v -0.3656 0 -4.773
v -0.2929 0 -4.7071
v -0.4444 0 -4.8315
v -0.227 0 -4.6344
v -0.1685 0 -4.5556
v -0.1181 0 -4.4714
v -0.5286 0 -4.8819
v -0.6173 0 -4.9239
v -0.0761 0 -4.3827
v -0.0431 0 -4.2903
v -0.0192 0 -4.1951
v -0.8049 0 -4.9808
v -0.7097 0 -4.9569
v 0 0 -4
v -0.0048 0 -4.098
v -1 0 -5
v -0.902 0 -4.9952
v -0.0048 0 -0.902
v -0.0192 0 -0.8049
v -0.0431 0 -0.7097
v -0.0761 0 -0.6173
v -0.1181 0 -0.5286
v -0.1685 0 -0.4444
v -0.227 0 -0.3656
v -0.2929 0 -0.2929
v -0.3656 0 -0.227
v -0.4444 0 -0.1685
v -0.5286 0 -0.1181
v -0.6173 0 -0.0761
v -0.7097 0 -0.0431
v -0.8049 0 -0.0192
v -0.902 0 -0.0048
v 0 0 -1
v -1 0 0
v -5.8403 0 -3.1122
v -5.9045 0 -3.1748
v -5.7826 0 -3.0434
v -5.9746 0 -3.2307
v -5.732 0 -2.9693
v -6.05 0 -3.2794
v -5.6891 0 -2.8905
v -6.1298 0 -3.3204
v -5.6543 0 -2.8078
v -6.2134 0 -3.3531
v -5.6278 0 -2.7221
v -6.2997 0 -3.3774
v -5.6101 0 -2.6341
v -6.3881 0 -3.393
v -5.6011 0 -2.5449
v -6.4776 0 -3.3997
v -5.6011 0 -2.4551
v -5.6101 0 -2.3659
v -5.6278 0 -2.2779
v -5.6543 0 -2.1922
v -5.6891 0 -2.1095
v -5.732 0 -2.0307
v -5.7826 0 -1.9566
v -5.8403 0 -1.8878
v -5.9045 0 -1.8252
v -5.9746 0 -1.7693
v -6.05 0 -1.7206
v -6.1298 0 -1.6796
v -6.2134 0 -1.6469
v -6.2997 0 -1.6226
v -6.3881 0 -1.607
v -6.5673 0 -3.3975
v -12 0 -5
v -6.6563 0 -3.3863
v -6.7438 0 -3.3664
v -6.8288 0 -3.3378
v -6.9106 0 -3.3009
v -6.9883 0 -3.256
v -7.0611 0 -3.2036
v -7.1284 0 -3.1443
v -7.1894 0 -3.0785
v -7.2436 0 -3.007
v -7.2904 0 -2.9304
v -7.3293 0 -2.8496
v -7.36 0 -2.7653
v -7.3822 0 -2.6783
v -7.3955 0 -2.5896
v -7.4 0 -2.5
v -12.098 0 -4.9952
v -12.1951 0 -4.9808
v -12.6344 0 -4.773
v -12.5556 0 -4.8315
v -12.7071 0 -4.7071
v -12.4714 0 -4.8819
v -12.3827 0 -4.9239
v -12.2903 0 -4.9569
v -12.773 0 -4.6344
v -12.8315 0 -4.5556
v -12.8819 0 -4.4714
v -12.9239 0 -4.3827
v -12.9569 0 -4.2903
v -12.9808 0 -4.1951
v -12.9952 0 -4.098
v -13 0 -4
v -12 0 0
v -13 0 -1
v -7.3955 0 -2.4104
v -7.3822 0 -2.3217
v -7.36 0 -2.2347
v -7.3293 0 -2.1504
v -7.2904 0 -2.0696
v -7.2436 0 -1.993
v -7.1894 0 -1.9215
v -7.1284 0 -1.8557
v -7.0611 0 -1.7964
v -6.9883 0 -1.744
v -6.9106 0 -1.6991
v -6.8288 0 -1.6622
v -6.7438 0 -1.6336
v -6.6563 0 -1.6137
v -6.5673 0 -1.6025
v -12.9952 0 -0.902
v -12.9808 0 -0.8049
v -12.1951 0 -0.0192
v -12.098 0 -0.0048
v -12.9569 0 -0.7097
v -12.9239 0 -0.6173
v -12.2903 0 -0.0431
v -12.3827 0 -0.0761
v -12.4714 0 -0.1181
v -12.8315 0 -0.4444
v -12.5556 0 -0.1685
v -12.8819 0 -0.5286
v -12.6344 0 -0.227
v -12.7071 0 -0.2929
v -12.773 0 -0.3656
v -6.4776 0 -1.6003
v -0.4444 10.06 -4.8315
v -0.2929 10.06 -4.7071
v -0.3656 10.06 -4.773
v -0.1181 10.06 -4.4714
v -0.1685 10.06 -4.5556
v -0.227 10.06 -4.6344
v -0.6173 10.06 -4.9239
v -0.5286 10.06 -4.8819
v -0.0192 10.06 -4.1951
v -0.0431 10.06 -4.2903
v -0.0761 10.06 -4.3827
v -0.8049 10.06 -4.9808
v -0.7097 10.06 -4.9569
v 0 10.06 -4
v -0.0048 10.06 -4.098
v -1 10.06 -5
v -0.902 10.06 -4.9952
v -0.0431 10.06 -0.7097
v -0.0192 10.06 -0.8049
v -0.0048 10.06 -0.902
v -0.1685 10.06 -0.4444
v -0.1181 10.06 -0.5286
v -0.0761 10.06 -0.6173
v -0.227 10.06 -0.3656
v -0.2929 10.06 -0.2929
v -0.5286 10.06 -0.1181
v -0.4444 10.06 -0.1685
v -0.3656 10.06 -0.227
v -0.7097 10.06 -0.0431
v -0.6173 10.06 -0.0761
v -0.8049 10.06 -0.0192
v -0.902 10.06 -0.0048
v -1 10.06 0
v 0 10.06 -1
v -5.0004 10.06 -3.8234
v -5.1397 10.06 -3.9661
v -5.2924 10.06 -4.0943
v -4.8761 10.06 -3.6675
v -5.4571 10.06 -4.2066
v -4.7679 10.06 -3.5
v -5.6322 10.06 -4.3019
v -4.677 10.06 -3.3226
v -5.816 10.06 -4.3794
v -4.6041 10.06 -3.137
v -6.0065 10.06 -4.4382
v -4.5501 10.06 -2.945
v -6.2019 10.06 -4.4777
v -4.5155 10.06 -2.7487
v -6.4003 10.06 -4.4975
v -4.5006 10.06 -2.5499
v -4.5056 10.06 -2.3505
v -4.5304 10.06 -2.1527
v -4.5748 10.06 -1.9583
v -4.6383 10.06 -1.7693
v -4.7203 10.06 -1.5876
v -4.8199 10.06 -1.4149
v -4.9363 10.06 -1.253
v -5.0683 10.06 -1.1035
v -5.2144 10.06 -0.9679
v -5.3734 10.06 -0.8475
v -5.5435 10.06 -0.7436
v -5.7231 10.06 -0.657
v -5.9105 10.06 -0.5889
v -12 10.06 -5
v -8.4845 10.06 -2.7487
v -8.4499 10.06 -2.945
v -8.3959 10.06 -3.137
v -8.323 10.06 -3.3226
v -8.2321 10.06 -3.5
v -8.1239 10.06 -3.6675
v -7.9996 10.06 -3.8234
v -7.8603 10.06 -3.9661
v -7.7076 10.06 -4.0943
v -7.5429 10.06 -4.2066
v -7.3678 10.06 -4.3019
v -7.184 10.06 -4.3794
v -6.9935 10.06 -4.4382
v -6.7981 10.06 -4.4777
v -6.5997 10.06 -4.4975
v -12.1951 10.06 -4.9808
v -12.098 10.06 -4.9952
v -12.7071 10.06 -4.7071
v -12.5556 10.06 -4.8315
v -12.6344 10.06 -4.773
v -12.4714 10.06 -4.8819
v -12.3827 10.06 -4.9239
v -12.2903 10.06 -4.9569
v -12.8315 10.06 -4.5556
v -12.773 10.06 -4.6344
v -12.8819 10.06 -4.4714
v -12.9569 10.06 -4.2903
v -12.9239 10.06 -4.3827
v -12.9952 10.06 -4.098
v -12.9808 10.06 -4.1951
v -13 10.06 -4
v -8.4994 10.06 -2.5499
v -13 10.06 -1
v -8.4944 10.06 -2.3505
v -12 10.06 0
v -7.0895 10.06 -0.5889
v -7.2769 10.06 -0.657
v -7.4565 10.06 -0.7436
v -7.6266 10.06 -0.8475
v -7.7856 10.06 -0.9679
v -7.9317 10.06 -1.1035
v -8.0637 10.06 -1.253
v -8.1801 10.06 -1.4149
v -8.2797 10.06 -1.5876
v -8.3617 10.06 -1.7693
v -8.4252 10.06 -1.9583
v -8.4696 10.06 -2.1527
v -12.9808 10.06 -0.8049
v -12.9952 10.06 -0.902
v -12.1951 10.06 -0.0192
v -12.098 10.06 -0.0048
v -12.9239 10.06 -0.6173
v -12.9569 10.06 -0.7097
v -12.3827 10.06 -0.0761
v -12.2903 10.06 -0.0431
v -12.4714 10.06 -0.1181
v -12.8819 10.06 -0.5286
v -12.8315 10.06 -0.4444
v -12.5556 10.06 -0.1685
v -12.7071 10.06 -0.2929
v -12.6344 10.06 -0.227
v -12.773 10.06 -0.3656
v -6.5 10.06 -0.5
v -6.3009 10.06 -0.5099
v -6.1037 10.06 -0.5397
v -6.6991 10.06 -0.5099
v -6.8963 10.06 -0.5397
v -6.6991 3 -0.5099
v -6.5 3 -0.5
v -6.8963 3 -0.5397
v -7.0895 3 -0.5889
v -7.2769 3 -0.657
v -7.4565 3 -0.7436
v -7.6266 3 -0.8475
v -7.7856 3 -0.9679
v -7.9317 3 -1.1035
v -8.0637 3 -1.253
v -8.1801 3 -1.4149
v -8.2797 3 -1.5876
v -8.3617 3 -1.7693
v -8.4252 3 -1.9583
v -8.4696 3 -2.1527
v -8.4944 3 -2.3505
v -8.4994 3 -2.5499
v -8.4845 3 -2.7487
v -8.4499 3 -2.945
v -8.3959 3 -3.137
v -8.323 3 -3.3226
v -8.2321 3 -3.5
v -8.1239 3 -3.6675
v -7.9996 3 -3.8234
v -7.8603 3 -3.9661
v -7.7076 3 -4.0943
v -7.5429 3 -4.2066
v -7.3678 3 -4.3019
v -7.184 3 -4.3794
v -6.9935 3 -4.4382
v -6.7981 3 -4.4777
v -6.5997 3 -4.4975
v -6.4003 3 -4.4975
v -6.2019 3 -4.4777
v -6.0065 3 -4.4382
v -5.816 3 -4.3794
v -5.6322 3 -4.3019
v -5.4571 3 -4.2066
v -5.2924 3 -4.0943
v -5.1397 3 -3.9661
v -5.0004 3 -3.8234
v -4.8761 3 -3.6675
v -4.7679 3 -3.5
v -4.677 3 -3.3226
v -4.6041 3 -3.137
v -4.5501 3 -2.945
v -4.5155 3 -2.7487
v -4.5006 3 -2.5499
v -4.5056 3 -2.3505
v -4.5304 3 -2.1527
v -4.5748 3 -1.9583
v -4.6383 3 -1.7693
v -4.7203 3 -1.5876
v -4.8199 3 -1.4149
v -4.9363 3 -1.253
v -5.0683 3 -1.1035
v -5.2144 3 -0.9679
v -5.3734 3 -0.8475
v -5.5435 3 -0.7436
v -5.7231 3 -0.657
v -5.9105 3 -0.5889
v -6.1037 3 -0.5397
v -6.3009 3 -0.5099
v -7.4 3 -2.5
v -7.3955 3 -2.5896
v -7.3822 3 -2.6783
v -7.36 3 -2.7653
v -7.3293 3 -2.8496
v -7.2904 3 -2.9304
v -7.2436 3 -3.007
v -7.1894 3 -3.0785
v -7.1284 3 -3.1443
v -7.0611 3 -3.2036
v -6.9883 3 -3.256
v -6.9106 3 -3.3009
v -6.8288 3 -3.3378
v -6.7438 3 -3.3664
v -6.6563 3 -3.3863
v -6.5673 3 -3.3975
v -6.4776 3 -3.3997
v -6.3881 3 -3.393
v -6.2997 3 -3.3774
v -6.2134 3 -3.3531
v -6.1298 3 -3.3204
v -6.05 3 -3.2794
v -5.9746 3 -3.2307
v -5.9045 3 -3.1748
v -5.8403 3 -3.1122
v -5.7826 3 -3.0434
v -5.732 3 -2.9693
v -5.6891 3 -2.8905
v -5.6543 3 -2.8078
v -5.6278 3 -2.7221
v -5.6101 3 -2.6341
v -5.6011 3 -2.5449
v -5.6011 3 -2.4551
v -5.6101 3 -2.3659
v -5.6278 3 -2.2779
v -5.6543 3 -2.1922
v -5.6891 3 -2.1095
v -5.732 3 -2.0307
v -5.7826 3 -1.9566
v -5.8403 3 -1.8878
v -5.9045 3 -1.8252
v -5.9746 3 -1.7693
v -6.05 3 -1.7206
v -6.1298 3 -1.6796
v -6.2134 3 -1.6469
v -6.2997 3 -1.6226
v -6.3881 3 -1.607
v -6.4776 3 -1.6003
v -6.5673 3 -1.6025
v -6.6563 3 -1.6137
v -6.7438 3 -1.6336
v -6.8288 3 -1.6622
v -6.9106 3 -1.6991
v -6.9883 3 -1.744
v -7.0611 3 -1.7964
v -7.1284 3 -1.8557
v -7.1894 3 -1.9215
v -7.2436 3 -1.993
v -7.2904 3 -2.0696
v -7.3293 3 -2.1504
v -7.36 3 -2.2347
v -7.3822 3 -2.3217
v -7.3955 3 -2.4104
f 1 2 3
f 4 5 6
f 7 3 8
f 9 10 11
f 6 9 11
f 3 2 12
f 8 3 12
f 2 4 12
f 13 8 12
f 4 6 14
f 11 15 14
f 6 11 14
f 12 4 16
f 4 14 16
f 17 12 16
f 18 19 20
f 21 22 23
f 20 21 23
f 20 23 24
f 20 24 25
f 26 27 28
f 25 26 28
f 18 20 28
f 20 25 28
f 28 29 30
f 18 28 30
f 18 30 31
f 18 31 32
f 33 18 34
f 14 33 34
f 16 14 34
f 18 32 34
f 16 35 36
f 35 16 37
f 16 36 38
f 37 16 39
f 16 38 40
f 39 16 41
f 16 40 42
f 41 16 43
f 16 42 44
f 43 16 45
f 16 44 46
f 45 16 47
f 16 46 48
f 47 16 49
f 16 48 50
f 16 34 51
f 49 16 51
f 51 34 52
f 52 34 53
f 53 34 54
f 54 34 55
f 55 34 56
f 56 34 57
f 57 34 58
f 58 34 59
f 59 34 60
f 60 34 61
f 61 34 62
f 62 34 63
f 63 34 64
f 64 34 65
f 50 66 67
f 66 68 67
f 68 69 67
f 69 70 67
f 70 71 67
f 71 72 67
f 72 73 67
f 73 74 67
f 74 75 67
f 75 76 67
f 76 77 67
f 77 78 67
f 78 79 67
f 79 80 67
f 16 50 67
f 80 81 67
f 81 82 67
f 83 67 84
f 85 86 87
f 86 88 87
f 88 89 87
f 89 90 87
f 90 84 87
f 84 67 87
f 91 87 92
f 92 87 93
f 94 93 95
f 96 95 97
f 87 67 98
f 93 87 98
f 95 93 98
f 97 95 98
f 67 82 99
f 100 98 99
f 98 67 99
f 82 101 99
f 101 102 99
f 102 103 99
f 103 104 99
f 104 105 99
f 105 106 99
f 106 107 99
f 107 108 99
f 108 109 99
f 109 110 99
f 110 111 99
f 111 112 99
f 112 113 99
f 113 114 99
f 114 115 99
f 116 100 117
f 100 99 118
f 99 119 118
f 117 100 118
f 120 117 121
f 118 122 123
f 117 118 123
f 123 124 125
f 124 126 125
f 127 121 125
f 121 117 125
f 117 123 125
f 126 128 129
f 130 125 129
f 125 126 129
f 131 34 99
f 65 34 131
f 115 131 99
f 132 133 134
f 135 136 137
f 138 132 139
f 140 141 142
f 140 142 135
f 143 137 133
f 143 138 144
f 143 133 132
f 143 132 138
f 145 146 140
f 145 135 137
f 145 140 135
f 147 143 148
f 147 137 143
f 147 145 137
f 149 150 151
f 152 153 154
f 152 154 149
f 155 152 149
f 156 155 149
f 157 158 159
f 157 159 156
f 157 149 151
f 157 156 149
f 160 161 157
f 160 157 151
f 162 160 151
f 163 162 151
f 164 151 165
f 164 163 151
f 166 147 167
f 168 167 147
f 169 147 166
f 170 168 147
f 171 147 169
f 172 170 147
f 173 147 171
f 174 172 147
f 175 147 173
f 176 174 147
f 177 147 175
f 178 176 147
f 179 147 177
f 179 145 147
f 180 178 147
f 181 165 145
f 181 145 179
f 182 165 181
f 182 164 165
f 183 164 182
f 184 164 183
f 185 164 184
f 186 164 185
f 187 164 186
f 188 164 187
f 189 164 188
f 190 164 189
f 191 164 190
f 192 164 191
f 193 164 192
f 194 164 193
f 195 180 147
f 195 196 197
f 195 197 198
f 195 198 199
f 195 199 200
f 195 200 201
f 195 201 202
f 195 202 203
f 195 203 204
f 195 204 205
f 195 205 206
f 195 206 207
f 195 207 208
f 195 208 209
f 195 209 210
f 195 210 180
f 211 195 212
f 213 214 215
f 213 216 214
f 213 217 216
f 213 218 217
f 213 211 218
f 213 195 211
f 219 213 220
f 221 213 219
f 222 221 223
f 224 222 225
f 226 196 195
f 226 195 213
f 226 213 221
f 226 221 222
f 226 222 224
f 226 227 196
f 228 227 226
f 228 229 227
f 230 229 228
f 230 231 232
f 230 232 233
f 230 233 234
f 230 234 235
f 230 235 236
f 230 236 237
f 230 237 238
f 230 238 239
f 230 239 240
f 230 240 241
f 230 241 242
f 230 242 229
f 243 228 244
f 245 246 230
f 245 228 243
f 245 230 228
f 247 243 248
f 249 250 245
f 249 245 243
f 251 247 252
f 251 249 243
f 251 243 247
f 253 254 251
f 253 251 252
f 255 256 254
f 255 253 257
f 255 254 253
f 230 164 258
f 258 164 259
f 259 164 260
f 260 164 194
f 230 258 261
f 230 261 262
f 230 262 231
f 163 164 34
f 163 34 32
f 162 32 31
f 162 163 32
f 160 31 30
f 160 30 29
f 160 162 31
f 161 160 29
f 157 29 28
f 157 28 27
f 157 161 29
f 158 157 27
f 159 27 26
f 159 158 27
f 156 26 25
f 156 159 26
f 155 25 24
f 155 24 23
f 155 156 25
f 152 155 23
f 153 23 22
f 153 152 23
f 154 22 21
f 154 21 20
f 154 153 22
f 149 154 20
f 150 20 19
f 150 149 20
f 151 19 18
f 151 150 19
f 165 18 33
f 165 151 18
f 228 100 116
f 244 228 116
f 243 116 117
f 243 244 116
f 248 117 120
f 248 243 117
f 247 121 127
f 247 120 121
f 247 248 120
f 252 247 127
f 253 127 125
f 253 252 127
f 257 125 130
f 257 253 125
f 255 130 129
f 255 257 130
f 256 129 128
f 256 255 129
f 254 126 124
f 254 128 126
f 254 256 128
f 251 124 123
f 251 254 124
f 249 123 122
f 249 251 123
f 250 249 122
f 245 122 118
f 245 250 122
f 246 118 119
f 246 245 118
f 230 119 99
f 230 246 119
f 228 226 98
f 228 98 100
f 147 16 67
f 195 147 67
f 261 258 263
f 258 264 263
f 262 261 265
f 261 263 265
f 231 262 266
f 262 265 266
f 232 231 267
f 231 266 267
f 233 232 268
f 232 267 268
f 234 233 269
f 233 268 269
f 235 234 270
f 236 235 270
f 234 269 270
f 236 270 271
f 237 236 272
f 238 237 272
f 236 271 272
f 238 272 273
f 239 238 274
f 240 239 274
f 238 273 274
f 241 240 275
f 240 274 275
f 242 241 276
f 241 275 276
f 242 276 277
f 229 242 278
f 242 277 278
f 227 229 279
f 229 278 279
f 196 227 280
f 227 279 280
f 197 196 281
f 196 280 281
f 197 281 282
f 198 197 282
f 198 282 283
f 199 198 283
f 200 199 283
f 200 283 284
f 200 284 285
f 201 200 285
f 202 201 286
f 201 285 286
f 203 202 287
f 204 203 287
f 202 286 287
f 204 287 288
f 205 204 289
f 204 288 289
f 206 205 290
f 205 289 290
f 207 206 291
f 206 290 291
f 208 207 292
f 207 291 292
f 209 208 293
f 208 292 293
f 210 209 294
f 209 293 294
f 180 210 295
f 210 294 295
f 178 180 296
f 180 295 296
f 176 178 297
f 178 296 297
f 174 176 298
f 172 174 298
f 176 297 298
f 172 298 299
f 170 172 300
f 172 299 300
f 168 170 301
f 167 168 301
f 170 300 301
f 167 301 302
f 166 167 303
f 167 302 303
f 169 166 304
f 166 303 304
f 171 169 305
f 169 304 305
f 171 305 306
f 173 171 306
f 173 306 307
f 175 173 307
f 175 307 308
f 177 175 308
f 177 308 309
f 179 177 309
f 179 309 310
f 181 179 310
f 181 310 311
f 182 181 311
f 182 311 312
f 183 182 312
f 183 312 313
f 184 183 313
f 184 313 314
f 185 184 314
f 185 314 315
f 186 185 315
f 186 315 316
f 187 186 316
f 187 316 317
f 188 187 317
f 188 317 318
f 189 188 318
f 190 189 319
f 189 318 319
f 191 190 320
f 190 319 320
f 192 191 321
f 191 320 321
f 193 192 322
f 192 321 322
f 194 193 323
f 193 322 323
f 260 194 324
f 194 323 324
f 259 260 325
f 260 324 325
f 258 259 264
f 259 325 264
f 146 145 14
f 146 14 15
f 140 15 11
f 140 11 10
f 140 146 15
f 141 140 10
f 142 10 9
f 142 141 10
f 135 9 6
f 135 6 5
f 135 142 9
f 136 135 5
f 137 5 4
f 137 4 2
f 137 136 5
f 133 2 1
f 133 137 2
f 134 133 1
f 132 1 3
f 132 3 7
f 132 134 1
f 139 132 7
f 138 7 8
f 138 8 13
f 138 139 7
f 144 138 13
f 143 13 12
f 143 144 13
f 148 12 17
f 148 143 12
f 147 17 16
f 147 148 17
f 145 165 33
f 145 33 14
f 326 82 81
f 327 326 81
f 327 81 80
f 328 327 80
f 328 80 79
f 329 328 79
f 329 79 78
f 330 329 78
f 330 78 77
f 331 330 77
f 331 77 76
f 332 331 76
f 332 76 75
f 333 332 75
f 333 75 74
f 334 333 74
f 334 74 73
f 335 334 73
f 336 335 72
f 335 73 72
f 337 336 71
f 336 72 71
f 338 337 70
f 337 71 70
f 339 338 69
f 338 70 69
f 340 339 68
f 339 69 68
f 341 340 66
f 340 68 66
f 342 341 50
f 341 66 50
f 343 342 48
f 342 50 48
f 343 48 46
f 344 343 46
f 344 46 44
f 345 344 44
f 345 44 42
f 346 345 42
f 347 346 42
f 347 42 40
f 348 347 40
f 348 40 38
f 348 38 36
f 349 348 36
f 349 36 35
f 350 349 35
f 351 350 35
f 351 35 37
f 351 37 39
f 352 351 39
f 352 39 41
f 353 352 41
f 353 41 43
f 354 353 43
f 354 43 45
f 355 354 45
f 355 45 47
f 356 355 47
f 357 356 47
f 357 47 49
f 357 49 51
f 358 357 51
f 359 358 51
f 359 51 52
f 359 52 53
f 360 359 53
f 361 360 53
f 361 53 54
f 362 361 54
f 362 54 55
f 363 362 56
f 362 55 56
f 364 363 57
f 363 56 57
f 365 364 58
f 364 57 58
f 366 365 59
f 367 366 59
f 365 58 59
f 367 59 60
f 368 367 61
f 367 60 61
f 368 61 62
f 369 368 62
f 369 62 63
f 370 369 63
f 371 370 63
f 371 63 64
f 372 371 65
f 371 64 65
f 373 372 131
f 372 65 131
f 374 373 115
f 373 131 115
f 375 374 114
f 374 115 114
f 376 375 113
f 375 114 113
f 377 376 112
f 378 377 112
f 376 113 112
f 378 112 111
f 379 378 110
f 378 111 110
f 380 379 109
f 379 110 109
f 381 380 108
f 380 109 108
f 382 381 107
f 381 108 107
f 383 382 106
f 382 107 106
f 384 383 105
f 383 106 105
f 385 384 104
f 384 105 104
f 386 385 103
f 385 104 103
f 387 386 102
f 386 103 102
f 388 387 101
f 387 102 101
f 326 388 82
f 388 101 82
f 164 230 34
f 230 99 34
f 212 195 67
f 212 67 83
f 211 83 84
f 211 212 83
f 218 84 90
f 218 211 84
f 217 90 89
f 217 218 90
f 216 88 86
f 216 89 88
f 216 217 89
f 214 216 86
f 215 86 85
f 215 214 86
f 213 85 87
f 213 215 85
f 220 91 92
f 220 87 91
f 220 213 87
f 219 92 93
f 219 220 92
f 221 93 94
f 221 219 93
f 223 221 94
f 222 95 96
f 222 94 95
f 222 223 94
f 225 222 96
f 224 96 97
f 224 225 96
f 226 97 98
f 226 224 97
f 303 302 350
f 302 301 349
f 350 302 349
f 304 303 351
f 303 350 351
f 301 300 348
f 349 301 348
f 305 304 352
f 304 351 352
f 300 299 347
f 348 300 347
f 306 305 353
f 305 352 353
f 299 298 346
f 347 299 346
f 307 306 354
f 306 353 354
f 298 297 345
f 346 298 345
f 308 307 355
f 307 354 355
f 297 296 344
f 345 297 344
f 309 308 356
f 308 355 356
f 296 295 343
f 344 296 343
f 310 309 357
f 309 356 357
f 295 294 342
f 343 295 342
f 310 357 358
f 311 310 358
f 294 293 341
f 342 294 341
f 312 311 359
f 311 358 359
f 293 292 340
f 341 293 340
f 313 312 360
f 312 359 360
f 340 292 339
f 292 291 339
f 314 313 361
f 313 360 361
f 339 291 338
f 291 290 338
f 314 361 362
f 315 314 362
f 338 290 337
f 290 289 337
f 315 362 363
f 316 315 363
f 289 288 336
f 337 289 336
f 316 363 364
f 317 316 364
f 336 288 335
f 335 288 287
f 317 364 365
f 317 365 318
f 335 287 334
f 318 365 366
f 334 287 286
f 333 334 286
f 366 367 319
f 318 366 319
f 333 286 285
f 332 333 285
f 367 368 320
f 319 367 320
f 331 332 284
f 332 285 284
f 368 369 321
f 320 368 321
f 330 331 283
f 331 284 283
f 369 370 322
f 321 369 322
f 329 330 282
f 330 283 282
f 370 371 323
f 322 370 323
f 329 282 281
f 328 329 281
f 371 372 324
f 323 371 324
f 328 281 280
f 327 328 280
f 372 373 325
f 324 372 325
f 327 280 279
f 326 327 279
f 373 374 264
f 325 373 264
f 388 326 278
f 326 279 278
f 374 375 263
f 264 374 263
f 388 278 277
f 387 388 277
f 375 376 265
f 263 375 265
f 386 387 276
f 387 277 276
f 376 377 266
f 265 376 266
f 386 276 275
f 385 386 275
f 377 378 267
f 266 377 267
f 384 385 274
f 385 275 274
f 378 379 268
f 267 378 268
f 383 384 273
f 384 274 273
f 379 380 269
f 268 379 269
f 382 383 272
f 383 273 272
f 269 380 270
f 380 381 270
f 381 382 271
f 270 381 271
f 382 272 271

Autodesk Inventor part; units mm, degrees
ref_plane "YZ Plane" through (0, 0, 0) normal (1, 0, 0) x (0, 1, 0)
ref_plane "XZ Plane" through (0, 0, 0) normal (0, 1, 0) x (-1, 0, 0)
ref_plane "XY Plane" through (0, 0, 0) normal (0, 0, 1) x (1, 0, 0)
sketch "Boceto1" plane through (0, 0, 0) normal (0, 1, 0) x (-1, 0, 0)
  line L0 (0, 0) -> (0, -5)
  line L1 (0, -5) -> (13, -5)
  line L2 (13, -5) -> (13, 0)
  line L3 (13, 0) -> (0, 0)
  circle A0 centre (6.5, -2.5) radius 0.9
  dimension "d0" = 5
  dimension "d1" = 13
  dimension "d2" = 1.8
extrude "Extrusión1" add sketch "Boceto1" along normal blind 10.06
sketch "Boceto2" plane through (0, 10.06, 0) normal (0, 1, 0) x (1, 0, 0)
  circle A0 centre (-6.5, 2.5) radius 0.9 projected
  point P0 (0, 0)
hole "Agujero1" at (-6.5, 10.06, -2.5) direction (0, -1, 0) diameter 4 depth 7.06
fillet "Empalme1" radius 1 4 edges at (0, 5.03, 0) (0, 5.03, -5) (-13, 5.03, 0) (-13, 5.03, -5)
properties part number "Soporte placa 2.0"
